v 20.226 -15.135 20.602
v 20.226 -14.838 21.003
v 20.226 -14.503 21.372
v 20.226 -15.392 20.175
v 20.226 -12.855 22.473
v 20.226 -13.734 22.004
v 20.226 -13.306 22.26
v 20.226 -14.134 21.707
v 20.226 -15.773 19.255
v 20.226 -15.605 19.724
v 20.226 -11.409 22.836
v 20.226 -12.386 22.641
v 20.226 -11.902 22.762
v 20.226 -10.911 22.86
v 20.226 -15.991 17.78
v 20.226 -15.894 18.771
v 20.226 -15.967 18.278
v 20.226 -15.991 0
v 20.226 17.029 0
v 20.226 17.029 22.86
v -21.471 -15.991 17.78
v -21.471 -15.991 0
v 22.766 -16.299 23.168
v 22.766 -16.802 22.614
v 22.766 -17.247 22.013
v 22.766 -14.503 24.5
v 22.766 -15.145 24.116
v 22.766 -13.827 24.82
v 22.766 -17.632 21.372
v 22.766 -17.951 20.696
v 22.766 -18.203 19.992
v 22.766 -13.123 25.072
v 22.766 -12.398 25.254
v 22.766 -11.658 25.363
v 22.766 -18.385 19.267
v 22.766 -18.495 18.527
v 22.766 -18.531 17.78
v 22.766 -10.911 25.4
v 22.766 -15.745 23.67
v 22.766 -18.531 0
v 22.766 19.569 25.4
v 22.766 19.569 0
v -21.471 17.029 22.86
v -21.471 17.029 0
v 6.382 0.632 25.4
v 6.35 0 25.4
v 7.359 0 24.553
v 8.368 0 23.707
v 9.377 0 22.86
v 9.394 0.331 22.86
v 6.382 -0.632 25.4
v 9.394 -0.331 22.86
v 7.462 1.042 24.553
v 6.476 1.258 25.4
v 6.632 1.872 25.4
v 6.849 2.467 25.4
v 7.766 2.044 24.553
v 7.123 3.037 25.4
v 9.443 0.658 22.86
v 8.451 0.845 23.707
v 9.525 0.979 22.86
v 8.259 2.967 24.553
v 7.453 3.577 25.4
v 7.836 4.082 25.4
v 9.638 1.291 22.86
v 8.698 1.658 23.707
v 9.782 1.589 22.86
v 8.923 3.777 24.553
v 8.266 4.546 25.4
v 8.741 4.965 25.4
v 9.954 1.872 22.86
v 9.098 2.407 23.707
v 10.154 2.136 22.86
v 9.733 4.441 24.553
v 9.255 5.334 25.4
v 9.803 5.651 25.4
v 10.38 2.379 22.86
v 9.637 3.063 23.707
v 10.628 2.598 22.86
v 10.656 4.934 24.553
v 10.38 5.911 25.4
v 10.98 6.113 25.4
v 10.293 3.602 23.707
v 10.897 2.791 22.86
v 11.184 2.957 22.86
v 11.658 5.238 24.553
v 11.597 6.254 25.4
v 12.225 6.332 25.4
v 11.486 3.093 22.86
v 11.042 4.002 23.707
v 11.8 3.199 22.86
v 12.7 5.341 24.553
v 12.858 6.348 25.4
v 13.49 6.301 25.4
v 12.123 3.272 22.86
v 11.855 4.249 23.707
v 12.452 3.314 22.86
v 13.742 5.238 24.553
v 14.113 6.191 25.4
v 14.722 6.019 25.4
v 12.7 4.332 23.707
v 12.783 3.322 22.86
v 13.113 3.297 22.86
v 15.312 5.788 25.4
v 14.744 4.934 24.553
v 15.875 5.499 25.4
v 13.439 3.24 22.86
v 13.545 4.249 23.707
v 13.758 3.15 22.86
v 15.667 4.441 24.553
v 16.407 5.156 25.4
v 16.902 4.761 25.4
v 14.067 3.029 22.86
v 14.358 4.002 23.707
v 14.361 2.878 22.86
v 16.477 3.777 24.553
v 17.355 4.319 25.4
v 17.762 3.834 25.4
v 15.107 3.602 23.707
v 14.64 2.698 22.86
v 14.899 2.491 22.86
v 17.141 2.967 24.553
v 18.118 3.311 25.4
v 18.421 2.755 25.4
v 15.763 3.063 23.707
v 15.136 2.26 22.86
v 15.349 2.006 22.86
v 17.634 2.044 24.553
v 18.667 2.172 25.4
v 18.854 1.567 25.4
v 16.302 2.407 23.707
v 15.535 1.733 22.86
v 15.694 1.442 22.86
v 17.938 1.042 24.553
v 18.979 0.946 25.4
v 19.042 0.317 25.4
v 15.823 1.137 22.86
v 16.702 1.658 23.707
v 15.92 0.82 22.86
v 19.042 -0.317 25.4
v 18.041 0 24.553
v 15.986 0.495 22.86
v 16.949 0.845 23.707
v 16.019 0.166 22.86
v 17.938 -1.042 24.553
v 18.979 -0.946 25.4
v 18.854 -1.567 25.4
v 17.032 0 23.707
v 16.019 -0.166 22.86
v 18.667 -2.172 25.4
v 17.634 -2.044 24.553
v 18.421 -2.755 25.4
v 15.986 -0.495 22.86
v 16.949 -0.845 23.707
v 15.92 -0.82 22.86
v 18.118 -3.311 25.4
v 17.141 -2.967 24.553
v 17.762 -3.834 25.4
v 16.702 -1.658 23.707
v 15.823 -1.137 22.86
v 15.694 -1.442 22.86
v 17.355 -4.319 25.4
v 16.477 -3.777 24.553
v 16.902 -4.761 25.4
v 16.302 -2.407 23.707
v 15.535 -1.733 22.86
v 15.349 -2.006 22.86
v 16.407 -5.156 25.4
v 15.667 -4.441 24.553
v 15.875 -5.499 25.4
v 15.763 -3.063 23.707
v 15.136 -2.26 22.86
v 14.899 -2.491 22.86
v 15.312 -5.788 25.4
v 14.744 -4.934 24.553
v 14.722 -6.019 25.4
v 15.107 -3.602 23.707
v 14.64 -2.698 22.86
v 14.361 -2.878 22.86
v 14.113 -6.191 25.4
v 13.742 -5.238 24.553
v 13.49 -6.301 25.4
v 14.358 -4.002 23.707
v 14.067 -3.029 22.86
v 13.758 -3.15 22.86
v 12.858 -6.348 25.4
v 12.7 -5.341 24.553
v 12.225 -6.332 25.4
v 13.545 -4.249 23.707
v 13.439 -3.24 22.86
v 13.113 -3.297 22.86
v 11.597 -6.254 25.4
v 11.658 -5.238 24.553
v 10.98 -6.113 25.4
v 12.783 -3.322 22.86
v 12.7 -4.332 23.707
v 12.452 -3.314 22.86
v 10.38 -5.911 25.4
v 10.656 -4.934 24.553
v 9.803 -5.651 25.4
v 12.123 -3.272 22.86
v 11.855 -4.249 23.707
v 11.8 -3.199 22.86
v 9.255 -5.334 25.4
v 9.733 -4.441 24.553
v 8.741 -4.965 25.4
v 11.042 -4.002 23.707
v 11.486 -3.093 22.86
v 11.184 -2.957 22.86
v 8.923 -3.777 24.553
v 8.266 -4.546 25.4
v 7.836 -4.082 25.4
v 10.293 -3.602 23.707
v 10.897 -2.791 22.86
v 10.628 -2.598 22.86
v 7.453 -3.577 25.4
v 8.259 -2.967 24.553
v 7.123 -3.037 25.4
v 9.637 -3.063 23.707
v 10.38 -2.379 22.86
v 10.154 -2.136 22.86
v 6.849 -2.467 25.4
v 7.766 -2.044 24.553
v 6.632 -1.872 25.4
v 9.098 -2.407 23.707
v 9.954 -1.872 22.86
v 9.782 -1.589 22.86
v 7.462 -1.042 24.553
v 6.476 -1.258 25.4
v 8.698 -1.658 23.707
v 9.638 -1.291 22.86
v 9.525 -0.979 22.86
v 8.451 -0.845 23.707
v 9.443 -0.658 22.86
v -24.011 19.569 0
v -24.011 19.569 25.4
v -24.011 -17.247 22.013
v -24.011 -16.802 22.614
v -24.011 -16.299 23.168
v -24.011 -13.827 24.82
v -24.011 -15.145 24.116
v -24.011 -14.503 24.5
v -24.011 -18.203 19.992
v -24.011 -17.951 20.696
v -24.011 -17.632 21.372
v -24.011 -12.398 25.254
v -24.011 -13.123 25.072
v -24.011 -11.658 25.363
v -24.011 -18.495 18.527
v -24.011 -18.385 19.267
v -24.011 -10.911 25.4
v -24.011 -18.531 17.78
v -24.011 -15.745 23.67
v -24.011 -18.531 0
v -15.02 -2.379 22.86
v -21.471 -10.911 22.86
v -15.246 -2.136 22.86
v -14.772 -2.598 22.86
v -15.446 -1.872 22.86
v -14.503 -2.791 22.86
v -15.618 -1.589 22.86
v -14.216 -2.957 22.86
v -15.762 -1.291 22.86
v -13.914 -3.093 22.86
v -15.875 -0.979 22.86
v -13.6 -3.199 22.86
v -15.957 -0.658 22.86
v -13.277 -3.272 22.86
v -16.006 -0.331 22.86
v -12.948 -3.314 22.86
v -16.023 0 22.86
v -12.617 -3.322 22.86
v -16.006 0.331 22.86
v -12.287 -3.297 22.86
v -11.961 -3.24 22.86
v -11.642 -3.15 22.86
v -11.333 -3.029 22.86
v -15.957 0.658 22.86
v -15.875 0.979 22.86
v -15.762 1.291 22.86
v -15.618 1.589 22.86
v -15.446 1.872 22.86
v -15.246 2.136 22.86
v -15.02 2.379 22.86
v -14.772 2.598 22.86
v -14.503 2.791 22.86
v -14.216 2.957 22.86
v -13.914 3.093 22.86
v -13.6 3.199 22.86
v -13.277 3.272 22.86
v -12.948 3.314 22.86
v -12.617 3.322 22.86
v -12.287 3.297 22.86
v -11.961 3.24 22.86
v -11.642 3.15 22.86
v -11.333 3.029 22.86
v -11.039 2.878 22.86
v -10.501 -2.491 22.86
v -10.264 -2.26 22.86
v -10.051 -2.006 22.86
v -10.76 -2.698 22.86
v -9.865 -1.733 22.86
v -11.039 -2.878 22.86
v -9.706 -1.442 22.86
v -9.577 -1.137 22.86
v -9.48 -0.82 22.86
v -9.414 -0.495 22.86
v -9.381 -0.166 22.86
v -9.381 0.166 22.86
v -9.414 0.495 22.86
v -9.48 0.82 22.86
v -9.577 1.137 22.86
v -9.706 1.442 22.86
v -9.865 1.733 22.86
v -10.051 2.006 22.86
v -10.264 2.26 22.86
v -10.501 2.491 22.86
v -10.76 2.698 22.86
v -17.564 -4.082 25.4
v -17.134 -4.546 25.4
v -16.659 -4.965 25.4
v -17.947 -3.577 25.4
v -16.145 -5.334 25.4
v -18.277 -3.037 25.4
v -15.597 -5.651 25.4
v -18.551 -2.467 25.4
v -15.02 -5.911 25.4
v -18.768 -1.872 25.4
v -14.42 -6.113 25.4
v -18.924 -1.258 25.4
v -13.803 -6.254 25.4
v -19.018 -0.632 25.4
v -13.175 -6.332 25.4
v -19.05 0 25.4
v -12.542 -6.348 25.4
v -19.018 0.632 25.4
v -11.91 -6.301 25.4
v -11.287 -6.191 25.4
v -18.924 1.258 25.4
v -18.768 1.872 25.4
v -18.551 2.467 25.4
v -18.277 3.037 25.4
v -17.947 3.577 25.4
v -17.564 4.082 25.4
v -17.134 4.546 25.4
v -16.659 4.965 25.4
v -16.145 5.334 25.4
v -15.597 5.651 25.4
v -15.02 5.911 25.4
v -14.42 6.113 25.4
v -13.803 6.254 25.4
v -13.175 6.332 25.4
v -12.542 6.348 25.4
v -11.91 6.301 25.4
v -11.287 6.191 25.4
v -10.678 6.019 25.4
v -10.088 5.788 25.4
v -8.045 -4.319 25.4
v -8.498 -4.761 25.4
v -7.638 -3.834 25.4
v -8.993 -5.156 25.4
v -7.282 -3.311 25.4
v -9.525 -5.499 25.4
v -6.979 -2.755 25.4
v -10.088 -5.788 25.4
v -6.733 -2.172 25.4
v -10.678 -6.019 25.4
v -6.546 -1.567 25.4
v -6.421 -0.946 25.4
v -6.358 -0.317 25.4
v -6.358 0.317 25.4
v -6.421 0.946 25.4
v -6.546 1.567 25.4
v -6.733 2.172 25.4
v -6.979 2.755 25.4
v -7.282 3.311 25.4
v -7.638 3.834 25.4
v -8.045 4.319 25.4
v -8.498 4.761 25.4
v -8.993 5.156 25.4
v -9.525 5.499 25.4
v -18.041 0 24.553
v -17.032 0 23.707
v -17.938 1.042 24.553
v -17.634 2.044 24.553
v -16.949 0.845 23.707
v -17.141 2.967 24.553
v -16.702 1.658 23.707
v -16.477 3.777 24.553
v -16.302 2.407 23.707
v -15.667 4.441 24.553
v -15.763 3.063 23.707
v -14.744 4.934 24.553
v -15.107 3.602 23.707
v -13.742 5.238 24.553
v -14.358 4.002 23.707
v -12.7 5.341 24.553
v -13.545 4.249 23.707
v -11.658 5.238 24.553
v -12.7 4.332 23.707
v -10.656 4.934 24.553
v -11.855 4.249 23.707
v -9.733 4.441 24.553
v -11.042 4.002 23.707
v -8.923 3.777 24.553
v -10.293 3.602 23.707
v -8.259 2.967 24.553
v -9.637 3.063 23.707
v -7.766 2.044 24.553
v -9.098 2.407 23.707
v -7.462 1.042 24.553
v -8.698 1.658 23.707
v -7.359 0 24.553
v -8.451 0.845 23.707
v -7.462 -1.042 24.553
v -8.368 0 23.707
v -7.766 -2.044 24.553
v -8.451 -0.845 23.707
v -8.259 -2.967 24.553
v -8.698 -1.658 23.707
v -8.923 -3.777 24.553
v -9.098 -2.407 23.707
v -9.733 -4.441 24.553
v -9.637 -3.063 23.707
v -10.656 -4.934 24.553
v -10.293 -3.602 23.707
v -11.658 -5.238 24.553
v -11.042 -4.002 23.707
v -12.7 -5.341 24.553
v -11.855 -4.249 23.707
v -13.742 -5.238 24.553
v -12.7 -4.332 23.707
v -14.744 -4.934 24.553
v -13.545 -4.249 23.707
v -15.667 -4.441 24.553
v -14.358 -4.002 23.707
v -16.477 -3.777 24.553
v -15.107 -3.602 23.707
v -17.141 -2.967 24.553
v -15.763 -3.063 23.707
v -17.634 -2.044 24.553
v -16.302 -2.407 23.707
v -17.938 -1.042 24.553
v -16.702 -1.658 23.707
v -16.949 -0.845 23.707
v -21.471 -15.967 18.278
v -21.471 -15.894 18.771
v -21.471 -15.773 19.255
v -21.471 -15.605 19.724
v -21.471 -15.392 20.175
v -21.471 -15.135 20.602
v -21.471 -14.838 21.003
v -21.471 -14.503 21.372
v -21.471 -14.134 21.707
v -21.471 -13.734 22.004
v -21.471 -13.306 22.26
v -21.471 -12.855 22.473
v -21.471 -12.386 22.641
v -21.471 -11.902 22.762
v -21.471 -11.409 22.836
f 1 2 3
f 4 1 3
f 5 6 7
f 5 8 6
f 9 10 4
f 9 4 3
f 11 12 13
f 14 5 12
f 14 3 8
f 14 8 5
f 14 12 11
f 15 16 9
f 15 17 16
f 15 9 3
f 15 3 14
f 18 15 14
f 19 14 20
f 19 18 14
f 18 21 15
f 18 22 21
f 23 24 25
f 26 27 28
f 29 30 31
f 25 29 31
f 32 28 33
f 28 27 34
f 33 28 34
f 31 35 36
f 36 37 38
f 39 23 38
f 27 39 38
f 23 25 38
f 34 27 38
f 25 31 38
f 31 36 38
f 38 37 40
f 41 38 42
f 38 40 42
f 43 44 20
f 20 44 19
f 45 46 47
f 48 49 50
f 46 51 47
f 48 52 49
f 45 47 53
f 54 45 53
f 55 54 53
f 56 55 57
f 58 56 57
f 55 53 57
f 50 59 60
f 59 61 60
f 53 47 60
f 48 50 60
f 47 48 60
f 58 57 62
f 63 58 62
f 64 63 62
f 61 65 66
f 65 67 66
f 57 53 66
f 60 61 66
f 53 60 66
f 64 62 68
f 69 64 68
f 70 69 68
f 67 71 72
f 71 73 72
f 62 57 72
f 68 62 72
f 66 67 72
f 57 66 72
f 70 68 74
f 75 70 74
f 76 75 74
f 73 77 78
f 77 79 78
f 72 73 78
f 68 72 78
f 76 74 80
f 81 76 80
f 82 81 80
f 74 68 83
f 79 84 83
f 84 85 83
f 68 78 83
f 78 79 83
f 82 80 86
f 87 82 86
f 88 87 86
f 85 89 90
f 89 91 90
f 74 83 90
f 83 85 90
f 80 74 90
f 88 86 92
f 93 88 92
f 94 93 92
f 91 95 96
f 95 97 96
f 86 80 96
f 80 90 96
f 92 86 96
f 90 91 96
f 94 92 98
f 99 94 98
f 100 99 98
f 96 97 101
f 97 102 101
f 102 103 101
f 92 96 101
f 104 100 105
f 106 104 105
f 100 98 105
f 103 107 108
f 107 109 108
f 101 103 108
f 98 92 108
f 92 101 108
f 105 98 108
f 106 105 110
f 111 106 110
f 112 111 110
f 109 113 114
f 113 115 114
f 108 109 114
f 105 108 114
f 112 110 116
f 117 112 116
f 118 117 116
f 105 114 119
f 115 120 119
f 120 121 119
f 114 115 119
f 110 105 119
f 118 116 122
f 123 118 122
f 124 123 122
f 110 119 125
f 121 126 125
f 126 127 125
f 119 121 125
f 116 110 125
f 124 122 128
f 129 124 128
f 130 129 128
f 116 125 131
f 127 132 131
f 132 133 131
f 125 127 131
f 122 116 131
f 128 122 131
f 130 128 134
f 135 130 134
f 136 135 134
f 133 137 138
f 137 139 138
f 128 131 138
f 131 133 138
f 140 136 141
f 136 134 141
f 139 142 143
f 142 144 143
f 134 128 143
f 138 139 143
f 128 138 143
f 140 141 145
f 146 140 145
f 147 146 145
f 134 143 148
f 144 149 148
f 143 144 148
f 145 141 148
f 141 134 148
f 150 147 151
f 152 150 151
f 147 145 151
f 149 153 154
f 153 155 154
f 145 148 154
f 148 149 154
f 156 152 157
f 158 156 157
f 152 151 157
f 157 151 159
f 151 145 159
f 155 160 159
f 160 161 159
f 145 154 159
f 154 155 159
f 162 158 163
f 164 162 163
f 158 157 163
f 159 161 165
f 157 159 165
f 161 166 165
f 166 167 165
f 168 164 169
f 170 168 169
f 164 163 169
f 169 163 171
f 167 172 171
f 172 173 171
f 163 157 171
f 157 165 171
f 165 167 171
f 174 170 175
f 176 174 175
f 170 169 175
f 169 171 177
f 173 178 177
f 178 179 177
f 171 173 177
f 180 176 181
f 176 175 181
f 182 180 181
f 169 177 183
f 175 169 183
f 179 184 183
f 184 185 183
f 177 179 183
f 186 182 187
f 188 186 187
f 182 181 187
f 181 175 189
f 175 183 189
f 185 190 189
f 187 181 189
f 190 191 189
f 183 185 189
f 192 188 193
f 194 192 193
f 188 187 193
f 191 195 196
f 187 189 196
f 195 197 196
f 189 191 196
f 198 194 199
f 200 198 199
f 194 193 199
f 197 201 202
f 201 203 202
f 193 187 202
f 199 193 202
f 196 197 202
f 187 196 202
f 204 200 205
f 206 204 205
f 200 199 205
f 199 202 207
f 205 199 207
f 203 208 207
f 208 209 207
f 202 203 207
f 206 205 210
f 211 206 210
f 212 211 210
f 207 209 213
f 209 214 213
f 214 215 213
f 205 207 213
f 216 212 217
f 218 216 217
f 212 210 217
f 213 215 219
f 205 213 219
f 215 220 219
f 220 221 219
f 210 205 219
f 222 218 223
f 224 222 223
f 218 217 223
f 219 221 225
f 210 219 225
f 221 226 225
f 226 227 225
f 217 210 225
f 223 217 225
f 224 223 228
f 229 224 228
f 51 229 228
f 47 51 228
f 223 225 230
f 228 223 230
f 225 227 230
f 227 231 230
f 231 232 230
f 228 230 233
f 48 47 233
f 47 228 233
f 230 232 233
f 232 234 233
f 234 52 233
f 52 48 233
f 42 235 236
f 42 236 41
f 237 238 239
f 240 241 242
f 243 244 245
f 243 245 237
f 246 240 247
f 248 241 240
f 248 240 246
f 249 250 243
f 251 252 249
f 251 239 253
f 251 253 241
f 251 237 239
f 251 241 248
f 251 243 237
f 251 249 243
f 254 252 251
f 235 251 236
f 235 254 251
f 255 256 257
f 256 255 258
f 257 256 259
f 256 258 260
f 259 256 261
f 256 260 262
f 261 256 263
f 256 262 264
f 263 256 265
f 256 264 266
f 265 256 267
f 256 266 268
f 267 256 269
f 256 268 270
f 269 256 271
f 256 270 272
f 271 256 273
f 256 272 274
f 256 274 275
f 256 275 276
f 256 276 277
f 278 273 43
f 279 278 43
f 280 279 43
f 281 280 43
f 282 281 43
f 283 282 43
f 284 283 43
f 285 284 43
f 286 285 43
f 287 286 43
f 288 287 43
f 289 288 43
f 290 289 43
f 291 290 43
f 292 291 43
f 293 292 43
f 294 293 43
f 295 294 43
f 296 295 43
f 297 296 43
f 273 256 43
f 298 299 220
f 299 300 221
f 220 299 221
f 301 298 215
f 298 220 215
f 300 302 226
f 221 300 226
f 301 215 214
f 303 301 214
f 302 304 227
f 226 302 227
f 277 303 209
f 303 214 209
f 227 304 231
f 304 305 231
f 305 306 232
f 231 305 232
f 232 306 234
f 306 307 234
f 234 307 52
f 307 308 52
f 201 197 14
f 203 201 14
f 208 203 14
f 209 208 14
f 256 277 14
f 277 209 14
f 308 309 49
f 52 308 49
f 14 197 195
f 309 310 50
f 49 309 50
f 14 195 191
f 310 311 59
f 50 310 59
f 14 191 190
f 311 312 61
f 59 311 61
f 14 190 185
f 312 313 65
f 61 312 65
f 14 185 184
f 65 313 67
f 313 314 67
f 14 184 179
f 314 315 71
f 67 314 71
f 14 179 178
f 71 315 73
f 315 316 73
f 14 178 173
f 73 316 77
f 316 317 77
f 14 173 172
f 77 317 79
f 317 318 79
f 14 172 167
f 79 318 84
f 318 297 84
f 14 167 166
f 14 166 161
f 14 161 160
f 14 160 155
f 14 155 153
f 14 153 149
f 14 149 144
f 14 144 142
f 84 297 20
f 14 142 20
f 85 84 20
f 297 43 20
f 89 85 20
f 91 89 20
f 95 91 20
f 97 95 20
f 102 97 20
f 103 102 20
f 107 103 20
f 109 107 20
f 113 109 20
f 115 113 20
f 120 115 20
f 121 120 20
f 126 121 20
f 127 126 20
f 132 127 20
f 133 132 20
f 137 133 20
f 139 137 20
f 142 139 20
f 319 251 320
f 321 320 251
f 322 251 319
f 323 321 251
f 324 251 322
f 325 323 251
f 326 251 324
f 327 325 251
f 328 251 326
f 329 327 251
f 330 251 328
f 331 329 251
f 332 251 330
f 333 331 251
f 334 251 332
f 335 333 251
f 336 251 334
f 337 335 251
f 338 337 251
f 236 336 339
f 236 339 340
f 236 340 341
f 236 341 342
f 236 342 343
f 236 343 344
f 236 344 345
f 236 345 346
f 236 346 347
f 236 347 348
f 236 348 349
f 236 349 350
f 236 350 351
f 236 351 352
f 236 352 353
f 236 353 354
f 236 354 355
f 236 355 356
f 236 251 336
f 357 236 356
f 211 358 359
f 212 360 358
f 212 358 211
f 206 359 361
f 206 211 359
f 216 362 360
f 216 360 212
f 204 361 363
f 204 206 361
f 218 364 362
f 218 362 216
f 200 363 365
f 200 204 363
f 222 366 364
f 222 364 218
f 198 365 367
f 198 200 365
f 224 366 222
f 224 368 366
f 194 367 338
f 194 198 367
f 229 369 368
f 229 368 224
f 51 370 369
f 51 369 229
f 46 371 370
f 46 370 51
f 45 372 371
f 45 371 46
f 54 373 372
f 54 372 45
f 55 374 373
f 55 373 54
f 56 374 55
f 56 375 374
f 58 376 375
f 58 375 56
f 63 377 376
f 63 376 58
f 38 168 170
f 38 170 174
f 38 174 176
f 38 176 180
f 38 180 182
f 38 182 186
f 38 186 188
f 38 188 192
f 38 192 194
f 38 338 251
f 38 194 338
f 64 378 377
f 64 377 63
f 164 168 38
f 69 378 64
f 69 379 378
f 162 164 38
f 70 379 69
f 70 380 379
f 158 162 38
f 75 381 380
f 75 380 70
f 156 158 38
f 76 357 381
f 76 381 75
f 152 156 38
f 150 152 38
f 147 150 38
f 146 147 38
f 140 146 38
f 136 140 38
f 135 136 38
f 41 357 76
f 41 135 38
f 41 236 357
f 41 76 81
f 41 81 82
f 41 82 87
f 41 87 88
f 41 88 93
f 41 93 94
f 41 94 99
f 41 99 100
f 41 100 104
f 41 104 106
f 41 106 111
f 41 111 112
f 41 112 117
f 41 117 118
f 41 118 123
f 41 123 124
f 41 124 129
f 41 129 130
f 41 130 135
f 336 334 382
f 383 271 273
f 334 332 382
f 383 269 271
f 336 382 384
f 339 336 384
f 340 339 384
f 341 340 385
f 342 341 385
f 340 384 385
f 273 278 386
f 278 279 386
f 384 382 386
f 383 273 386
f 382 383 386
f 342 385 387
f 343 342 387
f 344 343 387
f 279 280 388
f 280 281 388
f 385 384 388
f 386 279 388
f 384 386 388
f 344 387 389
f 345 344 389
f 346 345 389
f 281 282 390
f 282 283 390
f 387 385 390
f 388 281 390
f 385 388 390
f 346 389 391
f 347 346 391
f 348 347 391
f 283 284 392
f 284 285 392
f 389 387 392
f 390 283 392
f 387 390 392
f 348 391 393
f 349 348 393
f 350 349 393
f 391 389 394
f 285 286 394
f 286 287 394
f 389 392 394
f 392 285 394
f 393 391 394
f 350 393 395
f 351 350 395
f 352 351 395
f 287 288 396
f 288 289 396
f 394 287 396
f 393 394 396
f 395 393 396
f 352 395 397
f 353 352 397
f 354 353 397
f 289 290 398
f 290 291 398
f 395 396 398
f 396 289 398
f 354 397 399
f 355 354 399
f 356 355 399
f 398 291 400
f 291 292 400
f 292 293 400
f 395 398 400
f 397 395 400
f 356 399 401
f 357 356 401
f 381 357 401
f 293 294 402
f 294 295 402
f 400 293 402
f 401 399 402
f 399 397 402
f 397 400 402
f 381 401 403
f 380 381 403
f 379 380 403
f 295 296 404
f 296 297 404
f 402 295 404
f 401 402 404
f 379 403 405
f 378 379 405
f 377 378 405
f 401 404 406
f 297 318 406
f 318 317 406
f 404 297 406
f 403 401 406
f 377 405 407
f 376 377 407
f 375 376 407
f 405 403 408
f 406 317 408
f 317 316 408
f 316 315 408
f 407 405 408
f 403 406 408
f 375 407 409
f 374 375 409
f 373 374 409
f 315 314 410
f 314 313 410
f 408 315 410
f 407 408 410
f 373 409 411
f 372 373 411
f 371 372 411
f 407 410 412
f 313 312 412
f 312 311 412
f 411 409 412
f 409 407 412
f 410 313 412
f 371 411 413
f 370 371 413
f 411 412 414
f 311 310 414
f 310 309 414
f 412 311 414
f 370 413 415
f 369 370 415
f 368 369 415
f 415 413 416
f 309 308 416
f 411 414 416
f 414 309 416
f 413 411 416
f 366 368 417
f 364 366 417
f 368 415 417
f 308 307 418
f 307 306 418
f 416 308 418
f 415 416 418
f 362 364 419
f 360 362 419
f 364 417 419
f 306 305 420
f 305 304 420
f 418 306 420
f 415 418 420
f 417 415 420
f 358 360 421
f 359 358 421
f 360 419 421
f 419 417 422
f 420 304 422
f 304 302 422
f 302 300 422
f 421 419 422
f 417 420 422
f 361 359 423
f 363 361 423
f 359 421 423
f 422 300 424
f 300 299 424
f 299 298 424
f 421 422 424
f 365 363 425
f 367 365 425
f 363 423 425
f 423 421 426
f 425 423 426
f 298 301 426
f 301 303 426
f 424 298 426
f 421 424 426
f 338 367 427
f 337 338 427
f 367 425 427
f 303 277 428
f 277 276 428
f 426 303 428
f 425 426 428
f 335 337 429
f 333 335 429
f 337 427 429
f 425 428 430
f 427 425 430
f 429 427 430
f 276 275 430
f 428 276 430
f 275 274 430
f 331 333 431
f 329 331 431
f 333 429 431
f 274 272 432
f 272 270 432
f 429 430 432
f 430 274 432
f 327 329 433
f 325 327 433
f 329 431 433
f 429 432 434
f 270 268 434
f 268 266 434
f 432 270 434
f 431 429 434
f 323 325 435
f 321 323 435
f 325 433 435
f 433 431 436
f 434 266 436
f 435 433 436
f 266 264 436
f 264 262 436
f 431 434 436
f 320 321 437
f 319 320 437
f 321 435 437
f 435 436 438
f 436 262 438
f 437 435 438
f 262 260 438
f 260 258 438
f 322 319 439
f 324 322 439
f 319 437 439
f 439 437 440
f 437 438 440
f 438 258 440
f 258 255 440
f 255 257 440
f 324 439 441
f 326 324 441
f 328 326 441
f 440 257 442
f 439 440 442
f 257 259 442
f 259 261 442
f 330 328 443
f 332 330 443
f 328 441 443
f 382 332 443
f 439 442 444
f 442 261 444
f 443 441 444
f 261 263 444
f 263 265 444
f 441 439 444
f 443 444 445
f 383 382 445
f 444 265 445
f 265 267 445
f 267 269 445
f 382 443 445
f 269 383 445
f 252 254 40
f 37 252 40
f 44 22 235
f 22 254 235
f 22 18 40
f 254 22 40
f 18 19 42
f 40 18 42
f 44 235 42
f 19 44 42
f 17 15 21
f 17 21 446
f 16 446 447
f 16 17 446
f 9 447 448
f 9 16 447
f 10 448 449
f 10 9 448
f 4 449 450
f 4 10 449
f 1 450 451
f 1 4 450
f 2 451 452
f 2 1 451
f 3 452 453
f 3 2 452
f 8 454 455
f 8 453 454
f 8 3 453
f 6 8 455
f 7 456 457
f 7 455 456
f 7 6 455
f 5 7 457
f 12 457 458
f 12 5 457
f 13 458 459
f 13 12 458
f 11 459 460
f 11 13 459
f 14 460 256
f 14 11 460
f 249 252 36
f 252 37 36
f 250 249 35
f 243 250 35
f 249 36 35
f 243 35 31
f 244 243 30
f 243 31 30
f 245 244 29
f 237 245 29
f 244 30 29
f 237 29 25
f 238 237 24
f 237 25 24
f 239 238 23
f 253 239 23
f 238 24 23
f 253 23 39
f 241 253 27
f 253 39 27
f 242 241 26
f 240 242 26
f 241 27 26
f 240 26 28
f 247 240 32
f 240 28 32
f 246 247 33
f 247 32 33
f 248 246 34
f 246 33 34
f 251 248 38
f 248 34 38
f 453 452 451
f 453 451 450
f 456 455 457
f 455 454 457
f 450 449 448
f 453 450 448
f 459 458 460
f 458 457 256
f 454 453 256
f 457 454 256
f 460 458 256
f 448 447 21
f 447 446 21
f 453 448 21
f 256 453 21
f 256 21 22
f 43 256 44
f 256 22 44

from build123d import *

# Parameters (mm, degrees)
F0_W           = 46.776227
F0_H           = 38.1
F1_DEPTH       = 25.4
F2_R           = 7.62
F3_T           = -2.54
F5_D           = 6.35
F5_CSINK_D     = 12.7
F5_CSINK_ANGLE = 100


with BuildPart() as f1:
    # F0 (on Top) → F1 (new body)
    with BuildSketch(Plane.XY):
        with Locations((-0.622407, 0.518654)):
            Rectangle(F0_W, F0_H)
    extrude(amount=F1_DEPTH)

    # F2
    f2_edges = [f1.edges().sort_by_distance(p)[0] for p in [
        (-0.622407, -18.531346, 25.4),
    ]]
    fillet(f2_edges, radius=F2_R)

    # F3
    f3_openings = [f1.faces().sort_by_distance(p)[0] for p in [
        (-0.622407, 0.518654, 0),
    ]]
    offset(amount=F3_T, openings=f3_openings)

    # F5 (through all)
    with Locations(Plane.XY.offset(25.4)):
        with Locations((-12.7, 0), (12.7, 0)):
            CounterSinkHole(F5_D / 2, F5_CSINK_D / 2, counter_sink_angle=F5_CSINK_ANGLE)


solid = f1.part
